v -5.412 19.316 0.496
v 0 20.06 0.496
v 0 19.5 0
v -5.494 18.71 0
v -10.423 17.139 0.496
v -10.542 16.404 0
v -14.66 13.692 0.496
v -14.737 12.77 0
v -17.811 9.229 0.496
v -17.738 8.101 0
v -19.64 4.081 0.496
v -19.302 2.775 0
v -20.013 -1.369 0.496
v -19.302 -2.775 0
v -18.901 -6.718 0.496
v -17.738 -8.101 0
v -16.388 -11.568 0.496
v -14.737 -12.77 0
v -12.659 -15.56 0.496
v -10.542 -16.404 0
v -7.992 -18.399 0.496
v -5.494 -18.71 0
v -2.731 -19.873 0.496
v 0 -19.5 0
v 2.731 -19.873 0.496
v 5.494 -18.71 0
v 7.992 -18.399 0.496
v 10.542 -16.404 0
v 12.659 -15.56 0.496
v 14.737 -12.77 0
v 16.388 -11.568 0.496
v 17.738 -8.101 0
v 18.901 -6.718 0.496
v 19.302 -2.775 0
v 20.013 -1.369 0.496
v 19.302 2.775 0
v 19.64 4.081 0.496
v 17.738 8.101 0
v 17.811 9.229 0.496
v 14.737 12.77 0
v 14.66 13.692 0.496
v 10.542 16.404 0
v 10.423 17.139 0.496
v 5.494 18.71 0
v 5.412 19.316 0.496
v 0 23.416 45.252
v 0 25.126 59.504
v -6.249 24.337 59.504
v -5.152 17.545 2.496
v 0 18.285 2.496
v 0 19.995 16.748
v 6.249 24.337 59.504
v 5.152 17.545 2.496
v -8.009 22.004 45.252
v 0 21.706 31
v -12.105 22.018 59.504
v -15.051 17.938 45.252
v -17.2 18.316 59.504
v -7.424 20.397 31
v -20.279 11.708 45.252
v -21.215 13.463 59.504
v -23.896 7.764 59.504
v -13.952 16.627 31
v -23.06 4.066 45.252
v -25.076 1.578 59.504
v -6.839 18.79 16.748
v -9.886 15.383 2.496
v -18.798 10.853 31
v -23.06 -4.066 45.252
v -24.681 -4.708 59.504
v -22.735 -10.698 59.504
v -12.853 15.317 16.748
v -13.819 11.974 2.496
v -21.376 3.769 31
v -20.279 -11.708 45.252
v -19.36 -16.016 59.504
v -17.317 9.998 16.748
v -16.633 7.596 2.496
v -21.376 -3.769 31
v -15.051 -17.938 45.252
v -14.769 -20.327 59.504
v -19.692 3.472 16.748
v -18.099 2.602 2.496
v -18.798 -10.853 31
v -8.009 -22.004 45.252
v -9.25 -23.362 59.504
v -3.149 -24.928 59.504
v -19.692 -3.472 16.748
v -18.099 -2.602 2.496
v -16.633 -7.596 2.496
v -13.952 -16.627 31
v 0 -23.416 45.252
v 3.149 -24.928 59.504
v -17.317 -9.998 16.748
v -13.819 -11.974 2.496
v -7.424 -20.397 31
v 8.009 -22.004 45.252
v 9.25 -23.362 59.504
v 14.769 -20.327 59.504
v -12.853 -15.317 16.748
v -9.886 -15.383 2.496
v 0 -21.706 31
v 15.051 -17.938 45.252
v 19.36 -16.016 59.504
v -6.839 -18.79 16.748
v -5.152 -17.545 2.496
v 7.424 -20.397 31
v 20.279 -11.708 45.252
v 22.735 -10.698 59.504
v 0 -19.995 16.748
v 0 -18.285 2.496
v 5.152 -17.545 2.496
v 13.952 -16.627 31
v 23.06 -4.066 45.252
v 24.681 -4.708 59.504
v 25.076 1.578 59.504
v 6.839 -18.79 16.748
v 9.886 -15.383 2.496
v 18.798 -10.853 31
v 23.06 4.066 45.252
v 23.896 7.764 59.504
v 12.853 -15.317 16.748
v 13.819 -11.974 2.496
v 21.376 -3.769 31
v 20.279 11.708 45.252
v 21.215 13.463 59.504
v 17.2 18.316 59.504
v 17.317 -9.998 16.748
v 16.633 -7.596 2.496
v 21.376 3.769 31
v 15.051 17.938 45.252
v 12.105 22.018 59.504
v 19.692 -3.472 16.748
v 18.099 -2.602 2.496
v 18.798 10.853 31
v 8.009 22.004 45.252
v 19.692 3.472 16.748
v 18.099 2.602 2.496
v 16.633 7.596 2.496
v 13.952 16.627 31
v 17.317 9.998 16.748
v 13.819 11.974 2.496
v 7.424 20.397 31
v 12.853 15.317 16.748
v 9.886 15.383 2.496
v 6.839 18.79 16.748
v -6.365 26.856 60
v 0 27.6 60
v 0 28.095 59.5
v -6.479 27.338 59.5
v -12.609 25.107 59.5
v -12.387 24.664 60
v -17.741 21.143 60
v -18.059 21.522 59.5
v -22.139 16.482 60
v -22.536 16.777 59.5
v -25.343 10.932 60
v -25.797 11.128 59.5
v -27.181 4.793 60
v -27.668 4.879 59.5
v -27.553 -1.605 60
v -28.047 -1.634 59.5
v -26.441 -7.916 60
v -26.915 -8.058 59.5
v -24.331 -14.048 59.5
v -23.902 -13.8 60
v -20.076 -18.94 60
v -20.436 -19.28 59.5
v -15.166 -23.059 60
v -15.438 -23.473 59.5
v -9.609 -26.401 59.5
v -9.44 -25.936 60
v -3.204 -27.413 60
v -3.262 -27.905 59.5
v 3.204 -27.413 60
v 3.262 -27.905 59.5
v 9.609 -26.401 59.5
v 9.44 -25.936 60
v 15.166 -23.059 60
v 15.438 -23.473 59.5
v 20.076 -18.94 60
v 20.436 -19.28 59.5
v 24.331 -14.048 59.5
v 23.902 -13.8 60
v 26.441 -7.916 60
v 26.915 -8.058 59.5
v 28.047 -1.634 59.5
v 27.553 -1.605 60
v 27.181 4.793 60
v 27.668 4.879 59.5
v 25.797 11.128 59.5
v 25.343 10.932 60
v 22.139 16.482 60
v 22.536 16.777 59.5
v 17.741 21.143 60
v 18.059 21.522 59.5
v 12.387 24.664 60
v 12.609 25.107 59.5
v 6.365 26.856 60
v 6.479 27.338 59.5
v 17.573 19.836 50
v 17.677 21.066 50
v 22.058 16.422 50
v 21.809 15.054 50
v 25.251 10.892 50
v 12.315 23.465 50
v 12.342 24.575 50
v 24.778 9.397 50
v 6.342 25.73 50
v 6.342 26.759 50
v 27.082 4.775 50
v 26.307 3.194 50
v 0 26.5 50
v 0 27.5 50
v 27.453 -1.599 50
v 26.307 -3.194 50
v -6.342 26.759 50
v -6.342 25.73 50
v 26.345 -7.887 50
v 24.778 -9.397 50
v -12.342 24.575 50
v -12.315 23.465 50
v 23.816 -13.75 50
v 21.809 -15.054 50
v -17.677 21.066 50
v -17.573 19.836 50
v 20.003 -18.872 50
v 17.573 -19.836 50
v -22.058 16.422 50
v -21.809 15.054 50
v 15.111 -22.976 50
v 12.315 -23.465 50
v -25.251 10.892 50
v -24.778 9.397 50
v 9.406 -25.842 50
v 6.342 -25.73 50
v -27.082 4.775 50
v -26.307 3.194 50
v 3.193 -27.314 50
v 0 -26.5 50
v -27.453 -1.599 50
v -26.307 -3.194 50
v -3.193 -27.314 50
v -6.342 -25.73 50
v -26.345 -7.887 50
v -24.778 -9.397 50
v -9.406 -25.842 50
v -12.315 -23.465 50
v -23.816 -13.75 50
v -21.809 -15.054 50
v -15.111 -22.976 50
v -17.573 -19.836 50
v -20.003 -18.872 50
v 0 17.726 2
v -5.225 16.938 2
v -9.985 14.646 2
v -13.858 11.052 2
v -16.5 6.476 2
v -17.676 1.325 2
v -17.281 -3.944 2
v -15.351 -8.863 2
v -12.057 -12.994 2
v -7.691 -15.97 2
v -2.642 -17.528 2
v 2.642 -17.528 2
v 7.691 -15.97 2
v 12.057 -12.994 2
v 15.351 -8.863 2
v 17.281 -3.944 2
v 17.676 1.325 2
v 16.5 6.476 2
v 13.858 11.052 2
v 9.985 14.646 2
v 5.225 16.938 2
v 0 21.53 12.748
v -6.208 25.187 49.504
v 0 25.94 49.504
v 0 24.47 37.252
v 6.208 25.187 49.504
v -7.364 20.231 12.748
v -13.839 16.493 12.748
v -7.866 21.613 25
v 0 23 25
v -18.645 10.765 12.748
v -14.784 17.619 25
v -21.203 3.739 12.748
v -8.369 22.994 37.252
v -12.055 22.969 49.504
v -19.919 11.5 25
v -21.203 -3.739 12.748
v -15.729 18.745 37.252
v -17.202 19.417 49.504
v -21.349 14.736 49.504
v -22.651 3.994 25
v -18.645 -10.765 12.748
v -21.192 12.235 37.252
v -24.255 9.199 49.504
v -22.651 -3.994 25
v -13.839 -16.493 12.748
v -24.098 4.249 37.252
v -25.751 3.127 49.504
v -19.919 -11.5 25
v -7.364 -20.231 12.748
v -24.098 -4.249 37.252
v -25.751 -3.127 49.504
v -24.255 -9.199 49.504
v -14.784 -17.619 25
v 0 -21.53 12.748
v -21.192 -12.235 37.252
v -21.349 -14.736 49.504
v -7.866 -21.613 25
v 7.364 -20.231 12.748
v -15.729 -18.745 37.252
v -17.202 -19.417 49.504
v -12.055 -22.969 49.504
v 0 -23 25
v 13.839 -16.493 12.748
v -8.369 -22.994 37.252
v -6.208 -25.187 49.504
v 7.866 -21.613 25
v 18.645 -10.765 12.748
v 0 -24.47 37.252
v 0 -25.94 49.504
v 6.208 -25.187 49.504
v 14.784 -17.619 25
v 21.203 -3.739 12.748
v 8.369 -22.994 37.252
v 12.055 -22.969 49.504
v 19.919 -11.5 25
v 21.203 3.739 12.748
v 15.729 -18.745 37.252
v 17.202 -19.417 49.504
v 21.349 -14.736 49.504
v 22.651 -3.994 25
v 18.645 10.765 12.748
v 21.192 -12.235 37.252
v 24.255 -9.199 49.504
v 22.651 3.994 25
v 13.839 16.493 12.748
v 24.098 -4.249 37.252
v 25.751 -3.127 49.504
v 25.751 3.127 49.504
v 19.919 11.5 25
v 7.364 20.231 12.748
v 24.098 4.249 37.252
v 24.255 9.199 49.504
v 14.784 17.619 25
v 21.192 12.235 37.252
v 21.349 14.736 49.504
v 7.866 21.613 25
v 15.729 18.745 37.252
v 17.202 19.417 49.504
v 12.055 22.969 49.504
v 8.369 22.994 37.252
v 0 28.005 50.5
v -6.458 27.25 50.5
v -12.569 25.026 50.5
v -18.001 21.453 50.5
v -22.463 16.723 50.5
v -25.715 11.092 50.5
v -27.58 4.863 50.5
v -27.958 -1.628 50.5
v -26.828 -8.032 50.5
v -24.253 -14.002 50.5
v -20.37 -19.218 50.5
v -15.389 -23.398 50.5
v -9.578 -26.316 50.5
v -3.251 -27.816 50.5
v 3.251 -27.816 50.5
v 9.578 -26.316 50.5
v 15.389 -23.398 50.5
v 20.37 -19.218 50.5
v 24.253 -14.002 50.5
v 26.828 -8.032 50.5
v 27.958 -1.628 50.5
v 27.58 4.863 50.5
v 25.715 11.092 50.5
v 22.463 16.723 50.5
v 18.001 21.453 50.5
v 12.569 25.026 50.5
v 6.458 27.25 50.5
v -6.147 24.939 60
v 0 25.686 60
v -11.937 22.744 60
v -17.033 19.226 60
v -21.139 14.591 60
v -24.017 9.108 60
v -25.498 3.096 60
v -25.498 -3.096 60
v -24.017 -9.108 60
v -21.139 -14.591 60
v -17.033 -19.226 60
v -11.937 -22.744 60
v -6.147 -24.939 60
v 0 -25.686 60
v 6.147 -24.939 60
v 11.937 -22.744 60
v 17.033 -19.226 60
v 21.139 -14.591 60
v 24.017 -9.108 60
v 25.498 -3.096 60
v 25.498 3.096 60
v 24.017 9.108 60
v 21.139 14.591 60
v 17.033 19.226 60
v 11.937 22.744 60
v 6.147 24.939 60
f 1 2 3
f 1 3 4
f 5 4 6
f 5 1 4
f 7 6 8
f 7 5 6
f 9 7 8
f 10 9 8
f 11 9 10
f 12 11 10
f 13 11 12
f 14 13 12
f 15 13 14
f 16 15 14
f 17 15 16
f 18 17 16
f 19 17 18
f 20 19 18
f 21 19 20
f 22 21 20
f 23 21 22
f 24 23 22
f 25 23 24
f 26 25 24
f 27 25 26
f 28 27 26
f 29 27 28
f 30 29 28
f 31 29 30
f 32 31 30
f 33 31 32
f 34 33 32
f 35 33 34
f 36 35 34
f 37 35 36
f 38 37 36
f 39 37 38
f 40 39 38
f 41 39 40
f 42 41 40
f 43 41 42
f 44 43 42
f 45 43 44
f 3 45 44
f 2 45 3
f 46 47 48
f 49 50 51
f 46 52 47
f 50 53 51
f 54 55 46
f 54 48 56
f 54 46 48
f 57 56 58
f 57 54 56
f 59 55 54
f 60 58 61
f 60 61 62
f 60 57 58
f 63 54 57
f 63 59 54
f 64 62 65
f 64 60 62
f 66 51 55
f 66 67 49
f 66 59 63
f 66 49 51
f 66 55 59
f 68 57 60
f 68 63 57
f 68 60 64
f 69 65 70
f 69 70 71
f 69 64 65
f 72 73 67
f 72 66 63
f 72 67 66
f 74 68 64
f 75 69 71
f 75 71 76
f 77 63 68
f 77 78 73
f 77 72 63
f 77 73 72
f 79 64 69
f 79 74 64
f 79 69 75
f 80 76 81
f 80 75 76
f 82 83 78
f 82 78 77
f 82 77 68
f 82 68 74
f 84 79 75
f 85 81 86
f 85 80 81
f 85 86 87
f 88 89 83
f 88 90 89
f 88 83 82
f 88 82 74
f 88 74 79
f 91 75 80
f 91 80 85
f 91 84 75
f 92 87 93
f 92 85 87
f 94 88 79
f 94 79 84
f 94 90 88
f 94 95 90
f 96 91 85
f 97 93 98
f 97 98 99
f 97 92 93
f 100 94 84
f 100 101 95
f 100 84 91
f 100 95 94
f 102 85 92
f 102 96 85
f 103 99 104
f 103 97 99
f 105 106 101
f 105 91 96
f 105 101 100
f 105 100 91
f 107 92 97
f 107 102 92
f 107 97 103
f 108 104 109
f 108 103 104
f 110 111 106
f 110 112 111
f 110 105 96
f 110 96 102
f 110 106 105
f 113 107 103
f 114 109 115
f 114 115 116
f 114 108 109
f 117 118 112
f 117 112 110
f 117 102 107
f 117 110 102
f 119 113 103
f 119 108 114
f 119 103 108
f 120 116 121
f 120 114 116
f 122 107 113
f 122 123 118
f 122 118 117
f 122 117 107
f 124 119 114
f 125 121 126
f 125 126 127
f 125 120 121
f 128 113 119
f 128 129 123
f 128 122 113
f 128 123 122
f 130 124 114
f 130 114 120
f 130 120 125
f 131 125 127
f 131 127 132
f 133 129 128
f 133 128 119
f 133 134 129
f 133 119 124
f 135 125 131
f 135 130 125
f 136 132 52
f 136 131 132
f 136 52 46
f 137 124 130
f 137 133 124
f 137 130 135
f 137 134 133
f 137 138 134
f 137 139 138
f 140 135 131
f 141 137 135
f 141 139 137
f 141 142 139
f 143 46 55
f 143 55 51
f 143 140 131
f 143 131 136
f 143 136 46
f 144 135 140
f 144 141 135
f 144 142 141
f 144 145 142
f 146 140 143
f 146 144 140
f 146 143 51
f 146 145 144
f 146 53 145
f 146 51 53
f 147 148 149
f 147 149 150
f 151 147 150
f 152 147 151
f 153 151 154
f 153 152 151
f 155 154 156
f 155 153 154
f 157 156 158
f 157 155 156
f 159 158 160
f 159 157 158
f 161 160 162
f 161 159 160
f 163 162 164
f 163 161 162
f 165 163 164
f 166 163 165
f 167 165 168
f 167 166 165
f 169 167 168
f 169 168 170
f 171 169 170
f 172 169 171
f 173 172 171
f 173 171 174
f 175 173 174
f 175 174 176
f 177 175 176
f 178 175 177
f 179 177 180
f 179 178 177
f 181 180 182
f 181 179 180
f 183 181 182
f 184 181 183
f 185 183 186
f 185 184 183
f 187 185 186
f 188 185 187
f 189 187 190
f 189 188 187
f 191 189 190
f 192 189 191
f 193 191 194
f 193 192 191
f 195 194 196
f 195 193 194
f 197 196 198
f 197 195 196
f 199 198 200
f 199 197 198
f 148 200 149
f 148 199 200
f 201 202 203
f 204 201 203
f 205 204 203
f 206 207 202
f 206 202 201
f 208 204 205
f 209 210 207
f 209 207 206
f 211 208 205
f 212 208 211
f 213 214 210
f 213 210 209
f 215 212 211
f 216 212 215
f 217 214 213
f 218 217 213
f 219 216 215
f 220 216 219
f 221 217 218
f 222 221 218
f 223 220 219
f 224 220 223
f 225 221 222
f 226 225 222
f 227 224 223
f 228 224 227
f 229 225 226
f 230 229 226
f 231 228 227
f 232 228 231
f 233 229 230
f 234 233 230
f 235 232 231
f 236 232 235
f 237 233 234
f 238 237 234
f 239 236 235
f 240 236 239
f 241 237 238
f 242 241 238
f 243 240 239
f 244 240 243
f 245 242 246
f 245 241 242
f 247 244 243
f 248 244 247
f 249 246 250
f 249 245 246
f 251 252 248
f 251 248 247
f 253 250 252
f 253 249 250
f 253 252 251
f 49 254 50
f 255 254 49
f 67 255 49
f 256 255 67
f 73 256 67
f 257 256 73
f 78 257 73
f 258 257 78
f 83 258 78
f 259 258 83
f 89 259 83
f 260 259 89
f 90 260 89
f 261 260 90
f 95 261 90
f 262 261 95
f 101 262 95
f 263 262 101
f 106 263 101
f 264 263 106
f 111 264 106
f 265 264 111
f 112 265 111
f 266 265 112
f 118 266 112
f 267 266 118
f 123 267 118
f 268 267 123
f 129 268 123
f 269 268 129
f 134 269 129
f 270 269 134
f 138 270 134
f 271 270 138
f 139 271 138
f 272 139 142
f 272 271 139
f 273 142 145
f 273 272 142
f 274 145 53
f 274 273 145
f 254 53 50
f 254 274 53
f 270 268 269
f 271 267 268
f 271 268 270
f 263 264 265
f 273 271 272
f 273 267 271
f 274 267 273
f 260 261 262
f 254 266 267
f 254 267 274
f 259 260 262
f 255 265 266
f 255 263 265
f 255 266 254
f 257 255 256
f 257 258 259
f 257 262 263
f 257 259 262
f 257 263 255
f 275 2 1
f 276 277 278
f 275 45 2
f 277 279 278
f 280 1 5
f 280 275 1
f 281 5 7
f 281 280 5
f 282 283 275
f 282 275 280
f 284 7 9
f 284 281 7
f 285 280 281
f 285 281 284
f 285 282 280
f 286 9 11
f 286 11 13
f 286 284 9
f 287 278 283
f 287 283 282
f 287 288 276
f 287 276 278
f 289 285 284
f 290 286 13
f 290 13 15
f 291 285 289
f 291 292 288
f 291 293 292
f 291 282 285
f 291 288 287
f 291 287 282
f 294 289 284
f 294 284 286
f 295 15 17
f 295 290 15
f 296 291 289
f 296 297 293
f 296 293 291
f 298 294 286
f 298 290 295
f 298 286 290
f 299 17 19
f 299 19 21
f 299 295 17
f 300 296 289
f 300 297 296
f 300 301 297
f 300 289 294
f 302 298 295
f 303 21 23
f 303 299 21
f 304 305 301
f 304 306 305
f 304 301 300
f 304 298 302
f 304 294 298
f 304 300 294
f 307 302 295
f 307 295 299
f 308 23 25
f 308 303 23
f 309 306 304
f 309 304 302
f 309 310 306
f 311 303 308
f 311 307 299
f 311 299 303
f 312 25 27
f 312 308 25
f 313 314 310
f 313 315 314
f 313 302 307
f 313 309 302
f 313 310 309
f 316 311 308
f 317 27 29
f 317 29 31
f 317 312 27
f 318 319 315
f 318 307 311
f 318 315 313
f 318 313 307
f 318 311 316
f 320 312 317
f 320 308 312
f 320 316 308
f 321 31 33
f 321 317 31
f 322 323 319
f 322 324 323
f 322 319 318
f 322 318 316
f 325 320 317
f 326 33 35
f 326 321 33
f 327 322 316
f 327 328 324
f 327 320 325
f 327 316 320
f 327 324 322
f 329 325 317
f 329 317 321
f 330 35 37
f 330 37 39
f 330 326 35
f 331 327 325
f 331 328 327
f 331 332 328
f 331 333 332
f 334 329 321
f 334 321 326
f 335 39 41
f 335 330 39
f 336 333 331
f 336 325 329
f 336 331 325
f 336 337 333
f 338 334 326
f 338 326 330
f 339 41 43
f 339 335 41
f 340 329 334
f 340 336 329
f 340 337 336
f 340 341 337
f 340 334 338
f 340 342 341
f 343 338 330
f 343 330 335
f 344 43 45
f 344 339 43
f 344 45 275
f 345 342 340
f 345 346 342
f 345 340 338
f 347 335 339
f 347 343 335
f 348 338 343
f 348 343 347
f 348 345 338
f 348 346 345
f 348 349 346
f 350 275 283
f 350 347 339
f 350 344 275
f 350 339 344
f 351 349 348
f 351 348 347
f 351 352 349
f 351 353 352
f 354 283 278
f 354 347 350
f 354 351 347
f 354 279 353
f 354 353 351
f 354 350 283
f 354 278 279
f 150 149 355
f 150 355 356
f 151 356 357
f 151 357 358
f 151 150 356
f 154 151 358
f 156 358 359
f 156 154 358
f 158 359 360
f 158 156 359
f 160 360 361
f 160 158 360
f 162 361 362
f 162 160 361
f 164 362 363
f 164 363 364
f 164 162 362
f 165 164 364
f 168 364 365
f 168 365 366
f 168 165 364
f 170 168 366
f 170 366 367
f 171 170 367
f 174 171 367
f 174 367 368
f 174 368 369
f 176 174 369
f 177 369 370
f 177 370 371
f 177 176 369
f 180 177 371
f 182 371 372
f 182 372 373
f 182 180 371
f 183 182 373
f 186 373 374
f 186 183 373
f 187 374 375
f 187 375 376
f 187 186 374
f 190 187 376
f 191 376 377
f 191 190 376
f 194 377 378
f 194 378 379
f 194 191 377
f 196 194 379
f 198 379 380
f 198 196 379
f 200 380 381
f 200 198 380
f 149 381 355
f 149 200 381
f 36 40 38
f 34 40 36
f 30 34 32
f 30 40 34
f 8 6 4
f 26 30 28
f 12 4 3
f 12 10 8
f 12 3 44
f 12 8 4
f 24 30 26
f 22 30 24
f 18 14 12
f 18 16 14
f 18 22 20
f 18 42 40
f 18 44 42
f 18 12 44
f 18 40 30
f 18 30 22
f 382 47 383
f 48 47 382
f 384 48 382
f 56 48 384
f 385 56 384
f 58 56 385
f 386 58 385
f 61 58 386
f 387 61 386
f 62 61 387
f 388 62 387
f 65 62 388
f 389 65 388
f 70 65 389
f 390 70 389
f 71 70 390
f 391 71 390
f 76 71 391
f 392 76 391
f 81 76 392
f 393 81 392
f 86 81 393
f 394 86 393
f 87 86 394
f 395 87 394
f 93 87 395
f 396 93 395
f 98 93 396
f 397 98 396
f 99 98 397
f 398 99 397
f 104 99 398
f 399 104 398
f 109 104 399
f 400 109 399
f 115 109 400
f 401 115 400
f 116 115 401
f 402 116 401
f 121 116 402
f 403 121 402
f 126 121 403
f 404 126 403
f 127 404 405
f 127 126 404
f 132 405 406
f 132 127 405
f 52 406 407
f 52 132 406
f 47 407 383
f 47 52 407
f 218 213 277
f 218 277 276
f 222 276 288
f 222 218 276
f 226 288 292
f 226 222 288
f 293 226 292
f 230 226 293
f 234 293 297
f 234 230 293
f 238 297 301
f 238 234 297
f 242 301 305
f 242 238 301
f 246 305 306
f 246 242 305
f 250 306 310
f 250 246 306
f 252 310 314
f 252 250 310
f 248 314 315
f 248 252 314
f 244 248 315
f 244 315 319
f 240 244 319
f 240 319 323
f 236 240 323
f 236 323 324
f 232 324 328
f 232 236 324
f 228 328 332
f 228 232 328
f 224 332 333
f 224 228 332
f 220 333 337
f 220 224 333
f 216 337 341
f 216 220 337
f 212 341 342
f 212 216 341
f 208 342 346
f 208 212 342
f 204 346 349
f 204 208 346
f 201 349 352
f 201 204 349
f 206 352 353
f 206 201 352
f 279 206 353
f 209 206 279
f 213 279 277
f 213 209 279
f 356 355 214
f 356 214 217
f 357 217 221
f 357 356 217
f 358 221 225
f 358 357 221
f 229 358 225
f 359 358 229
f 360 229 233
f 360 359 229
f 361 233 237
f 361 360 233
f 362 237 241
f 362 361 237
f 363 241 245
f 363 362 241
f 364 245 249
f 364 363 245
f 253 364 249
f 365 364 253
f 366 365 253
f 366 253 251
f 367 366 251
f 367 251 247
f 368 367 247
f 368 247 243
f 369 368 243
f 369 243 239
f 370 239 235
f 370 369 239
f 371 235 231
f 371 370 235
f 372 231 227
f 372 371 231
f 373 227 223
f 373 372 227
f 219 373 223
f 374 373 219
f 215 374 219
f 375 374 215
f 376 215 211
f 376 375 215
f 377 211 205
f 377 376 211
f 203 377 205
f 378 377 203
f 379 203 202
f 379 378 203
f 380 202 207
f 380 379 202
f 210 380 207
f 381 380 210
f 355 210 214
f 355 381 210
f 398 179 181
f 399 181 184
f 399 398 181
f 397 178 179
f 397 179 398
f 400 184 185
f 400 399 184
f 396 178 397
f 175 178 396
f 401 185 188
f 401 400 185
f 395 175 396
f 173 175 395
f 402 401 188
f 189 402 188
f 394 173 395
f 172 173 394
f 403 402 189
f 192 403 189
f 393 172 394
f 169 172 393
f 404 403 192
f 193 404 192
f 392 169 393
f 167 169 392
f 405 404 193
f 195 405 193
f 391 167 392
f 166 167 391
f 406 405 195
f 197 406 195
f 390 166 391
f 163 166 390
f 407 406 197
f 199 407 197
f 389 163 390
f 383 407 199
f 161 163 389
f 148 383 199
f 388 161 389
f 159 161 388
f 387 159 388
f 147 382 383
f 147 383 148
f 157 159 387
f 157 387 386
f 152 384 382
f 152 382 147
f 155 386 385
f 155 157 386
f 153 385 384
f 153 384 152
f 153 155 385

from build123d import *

# Parameters (mm, degrees)
CHAMFER_SIZE = 0.5


with BuildPart() as part:
    # Sketch → Revolution (revolve)
    with BuildSketch(Plane.YZ):
        Polygon((0, 0), (20, 0), (26, 50), (28, 50), (28.1, 60), (25.185651, 60), (18.225651, 2), (0, 2), align=None)
    revolve(axis=Axis((0, 0, 0), (0, 0, 1)))

    # Chamfer
    chamfer_edges = [part.edges().sort_by_distance(p)[0] for p in [
        (0, -20, 0),
        (0, -28, 50),
        (0, -26, 50),
        (0, -28.1, 60),
        (0, -25.185651, 60),
        (0, -18.225651, 2),
    ]]
    chamfer(chamfer_edges, length=CHAMFER_SIZE)


solid = part.part
